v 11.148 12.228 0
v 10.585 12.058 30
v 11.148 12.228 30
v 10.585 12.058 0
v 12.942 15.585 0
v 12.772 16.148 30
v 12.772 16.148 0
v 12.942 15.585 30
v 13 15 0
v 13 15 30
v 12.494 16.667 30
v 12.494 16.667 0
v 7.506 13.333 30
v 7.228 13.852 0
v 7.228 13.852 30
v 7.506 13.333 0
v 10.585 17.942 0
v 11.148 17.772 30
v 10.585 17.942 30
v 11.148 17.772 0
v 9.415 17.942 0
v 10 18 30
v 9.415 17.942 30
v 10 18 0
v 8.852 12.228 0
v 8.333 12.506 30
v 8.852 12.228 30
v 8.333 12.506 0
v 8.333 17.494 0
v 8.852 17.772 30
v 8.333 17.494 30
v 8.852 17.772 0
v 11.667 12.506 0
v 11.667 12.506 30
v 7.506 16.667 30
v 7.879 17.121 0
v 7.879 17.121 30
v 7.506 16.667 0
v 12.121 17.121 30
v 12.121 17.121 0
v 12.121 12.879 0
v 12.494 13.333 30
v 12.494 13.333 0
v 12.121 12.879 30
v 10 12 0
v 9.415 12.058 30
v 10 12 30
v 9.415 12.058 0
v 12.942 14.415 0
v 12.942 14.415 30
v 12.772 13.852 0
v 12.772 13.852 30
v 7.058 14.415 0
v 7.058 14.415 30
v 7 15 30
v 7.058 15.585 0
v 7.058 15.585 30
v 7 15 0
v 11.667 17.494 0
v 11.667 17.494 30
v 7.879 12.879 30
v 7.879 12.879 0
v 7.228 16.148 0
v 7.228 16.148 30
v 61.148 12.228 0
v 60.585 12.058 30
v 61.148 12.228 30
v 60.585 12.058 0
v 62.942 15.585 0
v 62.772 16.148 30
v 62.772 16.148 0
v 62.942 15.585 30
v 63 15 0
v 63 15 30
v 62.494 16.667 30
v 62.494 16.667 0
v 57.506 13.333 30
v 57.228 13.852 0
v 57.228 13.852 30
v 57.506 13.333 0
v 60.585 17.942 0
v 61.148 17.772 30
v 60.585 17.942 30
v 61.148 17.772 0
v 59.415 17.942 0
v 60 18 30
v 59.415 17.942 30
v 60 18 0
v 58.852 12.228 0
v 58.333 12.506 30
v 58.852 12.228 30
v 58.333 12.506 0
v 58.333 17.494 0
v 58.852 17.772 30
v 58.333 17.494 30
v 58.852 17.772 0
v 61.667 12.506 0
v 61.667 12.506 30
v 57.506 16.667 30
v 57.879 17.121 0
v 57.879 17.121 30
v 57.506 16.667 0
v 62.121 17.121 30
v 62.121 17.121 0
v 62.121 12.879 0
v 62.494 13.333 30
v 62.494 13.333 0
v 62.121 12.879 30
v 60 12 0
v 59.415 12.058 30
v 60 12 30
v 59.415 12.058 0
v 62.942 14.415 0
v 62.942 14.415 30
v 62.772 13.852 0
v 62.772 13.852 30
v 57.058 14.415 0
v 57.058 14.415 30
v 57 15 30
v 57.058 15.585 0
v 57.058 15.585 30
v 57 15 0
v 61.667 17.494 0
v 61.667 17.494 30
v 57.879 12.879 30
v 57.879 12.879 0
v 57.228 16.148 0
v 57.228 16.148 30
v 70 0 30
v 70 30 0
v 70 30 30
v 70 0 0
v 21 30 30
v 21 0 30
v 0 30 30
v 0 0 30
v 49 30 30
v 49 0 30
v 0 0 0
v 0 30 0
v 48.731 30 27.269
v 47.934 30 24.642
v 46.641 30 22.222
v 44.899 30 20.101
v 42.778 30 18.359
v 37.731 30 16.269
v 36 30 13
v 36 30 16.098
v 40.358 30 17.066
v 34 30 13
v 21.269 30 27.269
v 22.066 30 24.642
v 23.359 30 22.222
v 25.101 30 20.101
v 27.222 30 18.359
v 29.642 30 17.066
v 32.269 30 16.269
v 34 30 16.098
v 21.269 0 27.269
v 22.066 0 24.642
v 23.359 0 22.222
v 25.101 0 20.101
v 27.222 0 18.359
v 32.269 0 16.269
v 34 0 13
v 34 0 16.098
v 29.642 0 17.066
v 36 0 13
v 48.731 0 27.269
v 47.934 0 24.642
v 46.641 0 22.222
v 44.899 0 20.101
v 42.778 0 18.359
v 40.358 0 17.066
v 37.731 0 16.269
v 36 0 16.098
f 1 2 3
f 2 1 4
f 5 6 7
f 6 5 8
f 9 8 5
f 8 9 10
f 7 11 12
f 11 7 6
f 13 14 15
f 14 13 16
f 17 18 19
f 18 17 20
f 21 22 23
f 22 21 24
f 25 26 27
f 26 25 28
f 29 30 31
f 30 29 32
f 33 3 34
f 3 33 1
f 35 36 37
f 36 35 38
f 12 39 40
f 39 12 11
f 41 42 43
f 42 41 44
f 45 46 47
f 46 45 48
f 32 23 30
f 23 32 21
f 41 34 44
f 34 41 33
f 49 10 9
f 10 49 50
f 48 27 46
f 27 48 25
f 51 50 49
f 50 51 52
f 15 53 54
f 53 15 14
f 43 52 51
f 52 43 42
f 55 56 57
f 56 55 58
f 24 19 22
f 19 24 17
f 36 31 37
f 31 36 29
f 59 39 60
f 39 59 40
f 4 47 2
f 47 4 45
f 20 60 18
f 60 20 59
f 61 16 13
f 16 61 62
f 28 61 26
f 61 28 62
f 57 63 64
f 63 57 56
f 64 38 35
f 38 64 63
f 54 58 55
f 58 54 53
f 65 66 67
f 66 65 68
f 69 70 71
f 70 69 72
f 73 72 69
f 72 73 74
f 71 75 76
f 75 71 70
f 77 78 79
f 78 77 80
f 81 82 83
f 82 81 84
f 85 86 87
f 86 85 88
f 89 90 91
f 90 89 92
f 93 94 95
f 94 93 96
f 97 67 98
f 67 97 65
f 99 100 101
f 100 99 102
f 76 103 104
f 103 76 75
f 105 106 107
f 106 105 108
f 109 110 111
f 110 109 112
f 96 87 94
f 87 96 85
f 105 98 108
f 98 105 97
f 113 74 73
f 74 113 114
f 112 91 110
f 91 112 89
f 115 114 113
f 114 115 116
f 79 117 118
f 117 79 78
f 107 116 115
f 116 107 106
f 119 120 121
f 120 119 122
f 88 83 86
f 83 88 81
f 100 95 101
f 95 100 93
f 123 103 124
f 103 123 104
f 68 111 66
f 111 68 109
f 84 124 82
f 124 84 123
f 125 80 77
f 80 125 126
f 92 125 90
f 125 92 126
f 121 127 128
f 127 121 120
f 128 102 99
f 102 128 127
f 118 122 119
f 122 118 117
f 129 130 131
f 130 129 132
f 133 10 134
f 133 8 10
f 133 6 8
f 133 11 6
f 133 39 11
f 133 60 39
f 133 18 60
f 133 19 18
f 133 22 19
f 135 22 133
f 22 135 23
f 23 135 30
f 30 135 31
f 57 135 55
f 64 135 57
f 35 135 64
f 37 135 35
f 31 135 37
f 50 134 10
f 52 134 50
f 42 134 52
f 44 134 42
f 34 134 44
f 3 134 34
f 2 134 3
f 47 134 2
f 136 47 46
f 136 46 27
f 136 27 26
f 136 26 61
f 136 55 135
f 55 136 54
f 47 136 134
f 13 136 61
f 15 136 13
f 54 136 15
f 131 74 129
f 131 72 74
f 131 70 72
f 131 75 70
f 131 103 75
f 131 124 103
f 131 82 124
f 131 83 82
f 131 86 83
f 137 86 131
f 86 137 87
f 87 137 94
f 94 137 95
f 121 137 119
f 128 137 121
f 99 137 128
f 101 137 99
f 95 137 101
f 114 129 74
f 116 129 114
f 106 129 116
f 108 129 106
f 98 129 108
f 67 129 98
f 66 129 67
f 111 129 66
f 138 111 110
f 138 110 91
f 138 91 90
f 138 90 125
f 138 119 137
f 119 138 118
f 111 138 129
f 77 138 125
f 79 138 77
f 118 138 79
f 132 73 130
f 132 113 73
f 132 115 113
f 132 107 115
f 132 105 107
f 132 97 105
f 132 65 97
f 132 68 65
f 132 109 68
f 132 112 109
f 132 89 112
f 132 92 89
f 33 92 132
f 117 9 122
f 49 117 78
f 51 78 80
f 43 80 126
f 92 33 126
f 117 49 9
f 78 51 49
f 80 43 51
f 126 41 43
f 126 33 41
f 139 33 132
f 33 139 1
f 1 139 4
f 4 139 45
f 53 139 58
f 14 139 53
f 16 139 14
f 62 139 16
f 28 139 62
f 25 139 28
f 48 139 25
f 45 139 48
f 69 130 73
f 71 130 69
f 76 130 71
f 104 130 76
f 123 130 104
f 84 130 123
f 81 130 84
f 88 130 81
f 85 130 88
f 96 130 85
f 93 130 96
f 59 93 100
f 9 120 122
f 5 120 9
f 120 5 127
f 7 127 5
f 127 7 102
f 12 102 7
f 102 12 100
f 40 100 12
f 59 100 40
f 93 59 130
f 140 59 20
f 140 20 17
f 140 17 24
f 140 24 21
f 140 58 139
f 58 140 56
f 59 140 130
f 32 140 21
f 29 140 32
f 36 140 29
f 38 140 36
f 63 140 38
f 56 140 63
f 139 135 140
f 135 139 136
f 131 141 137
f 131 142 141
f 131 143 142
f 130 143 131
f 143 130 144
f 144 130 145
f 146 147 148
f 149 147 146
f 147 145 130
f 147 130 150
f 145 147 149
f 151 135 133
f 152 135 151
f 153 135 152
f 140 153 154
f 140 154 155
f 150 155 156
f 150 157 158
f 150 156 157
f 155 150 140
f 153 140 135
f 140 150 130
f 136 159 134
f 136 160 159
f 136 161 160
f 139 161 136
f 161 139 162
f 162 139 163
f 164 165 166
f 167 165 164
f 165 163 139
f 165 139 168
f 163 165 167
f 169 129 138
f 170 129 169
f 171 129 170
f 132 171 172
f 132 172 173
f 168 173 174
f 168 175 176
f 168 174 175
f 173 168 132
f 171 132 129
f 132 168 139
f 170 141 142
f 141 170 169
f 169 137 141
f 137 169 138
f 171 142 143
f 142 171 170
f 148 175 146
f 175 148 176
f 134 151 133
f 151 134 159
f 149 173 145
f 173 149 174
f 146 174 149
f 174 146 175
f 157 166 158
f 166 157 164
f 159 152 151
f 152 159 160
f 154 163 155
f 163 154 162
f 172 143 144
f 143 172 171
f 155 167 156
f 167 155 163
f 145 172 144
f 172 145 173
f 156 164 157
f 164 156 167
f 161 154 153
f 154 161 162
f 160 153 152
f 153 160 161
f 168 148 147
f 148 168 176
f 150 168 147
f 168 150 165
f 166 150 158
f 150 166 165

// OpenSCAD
$fn = 32;

// ----------------------------------------------------------------------
// Saddle clamp: split shaft clamp
// ----------------------------------------------------------------------

// --- parameters (mm) ---
blk_l = 70;               // block length, X
blk_w = 30;               // block width, Y
blk_h = 30;               // block height
clamp_r = 14;             // shaft groove radius
hole_r = 3;               // bolt hole radius
hole_m = 10;              // bolt hole margin from the ends
saw_w = 2;                // saw kerf width
fit_tol = 0.1;            // tolerance for press fits, mm
free_tol = 0.3;           // tolerance for clearance fits, mm

saw_depth = clamp_r + 3;  // saw kerf depth

difference() {
  cube([blk_l, blk_w, blk_h]);
  translate([blk_l / 2, -1, blk_h])
    rotate([-90, 0, 0])
      cylinder(h = blk_w + 2, r = clamp_r);
  for (sx = [0, 1])
    translate([sx ? blk_l - hole_m : hole_m, blk_w / 2, -1])
      cylinder(r = hole_r, h = blk_h + 2);
  translate([blk_l / 2 - saw_w / 2, -1, blk_h - saw_depth])
    cube([saw_w, blk_w + 2, saw_depth + 1]);
}
